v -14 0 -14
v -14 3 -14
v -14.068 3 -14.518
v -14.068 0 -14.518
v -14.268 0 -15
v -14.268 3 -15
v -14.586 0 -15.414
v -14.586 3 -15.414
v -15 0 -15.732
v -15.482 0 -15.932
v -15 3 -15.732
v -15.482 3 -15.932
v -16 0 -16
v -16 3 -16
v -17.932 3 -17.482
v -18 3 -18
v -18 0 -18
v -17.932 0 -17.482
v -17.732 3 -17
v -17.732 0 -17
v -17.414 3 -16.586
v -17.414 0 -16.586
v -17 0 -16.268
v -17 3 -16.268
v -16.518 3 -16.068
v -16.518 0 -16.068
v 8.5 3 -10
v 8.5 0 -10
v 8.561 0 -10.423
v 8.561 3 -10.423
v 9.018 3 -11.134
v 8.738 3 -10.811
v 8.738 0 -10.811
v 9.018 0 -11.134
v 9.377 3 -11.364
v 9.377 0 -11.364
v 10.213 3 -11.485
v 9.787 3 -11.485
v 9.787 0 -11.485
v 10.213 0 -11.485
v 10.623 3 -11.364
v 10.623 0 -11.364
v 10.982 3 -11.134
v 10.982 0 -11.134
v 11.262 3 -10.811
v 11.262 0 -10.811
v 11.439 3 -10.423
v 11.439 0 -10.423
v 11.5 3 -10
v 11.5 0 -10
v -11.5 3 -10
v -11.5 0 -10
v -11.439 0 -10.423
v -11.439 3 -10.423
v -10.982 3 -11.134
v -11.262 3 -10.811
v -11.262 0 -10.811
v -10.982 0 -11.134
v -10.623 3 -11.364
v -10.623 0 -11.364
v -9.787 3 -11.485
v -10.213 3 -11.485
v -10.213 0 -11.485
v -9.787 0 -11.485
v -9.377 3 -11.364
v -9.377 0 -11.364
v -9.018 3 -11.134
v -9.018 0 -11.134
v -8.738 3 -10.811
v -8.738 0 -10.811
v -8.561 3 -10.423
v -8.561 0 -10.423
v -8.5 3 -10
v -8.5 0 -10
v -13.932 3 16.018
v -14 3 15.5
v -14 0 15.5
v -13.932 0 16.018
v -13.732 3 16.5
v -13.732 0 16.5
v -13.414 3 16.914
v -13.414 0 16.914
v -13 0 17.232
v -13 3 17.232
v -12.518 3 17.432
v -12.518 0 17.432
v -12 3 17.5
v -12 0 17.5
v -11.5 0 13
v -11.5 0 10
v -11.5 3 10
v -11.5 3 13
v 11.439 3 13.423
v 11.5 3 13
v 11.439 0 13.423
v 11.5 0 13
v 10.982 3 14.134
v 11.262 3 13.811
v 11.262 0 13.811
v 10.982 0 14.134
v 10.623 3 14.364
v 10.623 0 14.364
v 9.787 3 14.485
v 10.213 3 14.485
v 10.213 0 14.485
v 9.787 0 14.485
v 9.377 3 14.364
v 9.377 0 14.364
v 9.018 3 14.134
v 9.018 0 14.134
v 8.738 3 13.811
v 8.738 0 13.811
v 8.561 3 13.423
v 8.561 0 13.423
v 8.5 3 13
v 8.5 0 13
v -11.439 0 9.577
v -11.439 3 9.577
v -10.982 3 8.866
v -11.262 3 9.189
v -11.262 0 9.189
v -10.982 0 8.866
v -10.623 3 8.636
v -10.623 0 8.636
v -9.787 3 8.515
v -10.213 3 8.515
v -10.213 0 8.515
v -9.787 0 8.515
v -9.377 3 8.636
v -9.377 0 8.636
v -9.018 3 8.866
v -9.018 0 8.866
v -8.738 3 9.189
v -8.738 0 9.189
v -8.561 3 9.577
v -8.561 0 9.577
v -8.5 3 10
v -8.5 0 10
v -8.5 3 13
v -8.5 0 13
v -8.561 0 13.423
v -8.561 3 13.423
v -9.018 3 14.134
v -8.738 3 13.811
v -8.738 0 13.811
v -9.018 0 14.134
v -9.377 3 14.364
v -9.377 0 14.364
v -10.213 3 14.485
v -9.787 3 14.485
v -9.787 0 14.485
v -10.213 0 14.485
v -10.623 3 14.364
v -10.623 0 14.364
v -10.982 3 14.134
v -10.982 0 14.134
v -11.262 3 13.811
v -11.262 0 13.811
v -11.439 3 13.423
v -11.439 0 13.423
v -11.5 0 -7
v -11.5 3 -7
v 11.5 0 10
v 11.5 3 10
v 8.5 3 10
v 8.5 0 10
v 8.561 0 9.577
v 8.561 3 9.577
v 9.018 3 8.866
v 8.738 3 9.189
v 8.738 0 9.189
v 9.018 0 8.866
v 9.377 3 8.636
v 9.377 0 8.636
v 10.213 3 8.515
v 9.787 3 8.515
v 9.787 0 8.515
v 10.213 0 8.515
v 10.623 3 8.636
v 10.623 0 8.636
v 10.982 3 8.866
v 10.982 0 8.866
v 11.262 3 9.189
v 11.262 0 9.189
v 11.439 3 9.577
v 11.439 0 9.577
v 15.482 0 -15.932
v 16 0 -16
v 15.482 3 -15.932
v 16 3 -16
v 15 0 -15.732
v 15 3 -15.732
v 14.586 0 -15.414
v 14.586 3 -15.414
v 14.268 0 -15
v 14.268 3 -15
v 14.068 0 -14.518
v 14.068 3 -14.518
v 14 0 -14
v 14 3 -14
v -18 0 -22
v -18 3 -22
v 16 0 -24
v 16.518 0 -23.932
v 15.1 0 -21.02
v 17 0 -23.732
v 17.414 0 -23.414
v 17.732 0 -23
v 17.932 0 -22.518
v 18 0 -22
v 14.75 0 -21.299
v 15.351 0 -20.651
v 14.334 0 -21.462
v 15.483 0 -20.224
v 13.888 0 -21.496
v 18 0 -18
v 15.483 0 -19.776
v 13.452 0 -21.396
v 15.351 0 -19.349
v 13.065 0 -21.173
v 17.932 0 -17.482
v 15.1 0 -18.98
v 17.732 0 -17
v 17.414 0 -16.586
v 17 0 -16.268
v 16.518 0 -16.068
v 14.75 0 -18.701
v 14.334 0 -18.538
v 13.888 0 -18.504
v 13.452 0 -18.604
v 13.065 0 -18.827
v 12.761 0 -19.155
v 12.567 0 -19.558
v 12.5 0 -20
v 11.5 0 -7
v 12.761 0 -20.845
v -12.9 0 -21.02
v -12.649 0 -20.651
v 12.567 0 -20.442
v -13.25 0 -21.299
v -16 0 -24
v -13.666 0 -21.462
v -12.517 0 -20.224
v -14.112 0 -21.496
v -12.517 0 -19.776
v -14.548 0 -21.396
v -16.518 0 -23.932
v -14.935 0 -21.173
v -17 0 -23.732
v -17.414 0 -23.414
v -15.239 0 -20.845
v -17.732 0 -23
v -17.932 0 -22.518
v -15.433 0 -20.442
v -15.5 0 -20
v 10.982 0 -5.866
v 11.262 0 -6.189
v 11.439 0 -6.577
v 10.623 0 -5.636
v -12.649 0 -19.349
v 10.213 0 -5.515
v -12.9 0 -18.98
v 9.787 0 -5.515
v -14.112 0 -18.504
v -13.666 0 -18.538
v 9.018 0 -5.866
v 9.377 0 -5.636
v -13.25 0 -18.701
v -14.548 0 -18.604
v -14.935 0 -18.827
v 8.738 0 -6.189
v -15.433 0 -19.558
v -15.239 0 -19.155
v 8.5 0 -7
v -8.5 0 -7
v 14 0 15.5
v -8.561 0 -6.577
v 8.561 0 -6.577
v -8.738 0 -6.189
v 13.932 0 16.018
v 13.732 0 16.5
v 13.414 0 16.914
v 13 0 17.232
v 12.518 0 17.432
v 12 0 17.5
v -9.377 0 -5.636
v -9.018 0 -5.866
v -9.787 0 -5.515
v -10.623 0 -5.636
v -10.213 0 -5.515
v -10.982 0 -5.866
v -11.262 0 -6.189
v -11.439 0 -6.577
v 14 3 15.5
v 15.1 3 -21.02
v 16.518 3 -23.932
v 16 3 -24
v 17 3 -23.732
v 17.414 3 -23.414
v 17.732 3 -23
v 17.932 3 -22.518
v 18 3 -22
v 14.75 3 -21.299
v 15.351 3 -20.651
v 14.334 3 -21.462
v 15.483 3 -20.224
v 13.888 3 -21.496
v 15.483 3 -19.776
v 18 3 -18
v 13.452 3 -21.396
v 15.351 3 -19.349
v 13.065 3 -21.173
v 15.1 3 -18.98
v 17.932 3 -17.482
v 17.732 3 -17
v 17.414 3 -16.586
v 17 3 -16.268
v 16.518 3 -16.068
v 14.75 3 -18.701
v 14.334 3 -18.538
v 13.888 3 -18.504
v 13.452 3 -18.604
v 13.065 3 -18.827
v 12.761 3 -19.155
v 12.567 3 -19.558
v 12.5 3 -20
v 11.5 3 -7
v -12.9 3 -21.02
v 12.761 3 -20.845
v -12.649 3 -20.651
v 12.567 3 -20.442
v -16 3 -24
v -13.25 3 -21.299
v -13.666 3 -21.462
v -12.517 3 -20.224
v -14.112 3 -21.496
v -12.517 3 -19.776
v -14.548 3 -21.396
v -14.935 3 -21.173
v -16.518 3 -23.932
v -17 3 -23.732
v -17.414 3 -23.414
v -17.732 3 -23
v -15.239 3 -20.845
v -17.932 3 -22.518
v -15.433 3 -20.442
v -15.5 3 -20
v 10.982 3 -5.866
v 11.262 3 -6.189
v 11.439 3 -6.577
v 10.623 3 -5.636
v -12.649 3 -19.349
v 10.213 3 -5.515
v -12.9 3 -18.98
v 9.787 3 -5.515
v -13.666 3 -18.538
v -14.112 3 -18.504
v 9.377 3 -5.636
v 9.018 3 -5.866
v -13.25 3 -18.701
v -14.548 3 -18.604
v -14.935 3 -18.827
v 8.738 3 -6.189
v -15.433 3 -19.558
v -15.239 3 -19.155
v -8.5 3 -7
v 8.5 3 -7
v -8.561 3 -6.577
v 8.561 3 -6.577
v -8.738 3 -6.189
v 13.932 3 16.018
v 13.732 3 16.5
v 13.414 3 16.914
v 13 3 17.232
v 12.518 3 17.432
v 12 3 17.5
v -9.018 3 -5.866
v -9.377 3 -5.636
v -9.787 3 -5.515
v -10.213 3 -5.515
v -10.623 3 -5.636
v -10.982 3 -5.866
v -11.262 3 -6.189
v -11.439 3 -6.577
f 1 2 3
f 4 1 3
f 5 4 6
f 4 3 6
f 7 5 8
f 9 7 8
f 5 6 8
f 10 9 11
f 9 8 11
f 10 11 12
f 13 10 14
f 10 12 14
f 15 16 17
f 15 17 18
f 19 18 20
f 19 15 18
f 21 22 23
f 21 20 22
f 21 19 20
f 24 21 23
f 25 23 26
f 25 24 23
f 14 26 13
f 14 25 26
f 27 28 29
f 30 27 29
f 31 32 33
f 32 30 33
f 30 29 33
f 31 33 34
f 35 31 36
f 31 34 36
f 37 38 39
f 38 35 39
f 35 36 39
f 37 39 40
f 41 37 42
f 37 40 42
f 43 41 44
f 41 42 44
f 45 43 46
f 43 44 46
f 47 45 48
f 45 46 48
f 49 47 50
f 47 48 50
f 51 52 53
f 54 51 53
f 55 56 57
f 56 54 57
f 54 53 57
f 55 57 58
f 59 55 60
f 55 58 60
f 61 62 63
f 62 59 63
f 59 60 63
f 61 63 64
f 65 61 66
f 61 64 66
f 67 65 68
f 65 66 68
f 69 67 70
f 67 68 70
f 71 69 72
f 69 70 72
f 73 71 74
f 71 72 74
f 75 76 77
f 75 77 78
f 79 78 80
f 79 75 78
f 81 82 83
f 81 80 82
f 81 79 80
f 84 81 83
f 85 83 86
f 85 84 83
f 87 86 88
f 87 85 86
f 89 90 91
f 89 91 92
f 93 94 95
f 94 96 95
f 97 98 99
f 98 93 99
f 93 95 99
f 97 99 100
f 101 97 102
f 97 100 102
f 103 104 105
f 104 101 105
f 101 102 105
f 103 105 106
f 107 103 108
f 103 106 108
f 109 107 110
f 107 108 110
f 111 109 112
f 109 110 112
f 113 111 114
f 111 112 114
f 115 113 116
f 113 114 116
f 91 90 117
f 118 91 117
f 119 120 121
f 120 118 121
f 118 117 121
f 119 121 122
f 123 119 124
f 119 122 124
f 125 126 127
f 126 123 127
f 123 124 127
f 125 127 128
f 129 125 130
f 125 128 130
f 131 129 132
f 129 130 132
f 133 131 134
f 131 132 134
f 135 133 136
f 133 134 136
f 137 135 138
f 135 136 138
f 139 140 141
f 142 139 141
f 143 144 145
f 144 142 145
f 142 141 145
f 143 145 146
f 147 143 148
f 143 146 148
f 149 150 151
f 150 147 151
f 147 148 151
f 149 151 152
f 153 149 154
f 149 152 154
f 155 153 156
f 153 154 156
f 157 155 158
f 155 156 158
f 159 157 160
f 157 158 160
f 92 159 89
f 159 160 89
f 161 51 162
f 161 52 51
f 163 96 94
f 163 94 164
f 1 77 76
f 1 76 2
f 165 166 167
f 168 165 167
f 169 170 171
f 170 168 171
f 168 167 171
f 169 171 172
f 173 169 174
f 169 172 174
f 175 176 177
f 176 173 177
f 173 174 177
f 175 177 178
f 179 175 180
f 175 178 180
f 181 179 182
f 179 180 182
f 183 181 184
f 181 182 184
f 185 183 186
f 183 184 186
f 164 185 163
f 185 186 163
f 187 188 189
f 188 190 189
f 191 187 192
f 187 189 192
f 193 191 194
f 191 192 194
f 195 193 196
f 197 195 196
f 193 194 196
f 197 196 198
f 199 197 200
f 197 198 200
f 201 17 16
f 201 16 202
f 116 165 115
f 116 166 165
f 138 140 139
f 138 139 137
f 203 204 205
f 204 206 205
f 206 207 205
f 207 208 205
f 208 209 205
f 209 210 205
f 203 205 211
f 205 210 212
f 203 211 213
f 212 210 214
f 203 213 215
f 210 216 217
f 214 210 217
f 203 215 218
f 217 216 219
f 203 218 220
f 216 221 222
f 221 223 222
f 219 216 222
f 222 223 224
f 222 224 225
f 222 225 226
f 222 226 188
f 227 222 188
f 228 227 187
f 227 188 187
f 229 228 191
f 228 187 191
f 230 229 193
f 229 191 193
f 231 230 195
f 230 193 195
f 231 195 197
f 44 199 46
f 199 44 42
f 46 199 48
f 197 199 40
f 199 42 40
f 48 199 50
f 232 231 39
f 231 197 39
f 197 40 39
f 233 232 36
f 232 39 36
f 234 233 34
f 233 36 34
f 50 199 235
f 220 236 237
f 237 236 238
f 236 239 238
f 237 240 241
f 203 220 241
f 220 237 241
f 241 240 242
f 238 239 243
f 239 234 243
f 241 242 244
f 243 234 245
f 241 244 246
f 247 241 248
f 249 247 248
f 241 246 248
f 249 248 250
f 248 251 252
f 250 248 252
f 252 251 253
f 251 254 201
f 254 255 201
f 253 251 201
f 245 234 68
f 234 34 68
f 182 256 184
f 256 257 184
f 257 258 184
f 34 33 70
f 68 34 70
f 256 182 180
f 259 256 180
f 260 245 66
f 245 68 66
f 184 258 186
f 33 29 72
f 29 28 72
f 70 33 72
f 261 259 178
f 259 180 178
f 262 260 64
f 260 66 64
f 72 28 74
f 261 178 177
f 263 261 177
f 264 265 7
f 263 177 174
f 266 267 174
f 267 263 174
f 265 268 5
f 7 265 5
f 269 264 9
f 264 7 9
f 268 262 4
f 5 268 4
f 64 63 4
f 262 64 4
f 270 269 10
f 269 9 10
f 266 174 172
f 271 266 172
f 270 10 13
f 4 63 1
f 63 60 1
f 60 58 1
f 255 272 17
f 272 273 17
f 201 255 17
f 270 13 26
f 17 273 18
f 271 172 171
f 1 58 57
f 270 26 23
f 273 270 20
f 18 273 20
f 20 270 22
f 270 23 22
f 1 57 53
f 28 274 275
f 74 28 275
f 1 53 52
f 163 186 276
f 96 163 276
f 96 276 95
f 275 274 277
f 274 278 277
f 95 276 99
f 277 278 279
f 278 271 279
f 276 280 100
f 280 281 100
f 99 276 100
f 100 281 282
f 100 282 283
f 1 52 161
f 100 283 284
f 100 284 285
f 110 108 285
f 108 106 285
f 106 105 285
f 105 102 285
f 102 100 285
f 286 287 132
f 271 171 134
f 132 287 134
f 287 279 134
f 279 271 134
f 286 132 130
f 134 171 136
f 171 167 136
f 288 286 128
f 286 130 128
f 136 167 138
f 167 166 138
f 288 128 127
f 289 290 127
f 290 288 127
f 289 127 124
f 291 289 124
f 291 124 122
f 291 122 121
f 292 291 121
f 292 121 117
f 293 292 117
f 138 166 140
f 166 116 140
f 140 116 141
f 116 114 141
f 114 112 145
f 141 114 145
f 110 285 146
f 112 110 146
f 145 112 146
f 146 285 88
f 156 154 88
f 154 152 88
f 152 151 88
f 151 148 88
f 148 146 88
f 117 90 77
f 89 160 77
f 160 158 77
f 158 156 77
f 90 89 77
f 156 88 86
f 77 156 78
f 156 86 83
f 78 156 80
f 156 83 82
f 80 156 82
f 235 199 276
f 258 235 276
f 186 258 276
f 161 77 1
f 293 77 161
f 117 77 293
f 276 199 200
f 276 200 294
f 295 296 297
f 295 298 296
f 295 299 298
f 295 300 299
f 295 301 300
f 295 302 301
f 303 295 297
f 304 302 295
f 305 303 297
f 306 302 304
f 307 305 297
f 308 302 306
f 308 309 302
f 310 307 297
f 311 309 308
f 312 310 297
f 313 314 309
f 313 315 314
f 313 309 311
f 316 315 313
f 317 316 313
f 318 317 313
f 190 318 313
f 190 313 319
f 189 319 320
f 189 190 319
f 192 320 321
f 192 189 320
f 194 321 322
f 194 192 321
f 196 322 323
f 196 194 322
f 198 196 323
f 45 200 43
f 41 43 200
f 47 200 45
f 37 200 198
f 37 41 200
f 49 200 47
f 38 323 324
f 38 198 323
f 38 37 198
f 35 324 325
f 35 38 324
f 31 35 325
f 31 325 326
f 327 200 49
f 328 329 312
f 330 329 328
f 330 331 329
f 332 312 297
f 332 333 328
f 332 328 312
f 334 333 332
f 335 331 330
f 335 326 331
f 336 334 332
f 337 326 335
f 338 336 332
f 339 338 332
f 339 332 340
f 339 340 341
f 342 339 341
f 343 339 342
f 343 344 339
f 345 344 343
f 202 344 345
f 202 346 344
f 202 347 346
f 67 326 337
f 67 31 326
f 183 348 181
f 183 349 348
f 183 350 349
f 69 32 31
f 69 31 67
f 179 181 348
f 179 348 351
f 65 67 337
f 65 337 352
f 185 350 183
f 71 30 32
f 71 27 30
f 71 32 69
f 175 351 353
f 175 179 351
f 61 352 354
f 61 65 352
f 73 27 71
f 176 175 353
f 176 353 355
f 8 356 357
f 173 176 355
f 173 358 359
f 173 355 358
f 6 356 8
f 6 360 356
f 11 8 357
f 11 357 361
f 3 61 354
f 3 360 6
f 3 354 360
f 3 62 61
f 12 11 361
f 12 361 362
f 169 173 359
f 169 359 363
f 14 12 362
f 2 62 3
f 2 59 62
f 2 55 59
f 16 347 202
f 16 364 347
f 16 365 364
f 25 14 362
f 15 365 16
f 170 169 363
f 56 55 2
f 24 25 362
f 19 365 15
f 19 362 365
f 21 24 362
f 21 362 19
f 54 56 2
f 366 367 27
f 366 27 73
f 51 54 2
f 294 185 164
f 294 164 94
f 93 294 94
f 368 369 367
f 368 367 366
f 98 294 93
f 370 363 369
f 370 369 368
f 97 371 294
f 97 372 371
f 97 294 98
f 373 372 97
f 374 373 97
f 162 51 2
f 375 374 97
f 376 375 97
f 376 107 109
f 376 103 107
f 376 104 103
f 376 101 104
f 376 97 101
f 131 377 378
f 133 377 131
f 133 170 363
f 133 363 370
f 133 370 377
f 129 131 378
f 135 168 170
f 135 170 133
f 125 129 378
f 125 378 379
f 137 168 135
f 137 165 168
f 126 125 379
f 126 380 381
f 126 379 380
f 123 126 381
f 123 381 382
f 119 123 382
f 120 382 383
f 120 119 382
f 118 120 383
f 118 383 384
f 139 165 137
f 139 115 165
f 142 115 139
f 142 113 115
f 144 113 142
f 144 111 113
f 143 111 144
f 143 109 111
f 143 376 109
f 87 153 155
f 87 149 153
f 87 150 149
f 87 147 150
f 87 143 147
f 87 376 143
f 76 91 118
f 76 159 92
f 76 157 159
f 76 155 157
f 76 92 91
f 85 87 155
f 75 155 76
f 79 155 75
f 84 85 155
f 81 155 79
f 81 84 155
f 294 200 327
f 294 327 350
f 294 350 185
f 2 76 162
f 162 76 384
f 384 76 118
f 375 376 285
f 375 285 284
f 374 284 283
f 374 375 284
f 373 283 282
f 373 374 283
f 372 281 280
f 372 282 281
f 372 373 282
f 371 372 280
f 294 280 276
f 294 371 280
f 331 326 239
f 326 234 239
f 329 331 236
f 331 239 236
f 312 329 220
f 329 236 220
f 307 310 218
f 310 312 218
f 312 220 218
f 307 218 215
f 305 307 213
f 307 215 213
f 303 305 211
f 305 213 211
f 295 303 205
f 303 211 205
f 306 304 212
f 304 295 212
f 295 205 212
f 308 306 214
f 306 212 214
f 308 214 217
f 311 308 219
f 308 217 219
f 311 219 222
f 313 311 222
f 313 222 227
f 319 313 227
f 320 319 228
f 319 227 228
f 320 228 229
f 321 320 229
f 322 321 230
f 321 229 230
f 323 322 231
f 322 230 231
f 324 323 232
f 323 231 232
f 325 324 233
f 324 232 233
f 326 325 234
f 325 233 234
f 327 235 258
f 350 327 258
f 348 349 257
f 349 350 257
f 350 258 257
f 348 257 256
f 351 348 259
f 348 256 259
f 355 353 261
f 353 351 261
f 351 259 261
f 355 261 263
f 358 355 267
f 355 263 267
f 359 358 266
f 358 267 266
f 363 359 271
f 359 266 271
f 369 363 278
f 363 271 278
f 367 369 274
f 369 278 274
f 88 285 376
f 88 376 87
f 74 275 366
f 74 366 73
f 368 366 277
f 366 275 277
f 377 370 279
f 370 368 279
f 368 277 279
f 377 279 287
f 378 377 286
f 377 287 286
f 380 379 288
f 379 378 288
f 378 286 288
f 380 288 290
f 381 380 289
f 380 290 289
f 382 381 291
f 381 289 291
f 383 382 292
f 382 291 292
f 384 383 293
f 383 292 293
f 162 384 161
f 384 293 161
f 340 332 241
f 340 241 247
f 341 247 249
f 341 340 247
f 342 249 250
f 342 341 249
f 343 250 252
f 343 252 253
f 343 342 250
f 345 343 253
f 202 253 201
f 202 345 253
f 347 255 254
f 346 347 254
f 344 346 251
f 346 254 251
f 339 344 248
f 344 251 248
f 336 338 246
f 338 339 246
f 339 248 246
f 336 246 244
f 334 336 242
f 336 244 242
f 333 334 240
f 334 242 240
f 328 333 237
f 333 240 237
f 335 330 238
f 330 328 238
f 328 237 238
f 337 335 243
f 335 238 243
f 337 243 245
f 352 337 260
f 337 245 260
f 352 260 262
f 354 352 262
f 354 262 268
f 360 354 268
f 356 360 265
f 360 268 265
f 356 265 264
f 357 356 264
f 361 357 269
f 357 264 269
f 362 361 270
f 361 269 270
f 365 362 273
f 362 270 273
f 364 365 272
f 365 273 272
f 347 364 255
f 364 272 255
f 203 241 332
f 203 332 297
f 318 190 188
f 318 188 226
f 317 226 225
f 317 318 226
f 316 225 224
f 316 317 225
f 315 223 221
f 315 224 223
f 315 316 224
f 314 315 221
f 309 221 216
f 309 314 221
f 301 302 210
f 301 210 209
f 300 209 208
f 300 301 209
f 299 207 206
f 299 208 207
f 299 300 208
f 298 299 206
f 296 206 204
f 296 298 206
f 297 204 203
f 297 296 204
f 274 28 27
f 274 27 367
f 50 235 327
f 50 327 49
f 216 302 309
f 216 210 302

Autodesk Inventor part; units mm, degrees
ref_plane "YZ Plane" through (0, 0, 0) normal (1, 0, 0) x (0, 1, 0)
ref_plane "XZ Plane" through (0, 0, 0) normal (0, 1, 0) x (-1, 0, 0)
ref_plane "XY Plane" through (0, 0, 0) normal (0, 0, 1) x (1, 0, 0)
sketch "Sketch1" plane through (0, 0, 0) normal (0, 1, 0) x (-1, 0, 0)
  line L0 (10, -10) -> (-10, -10) construction
  line L1 (-10, -10) -> (-10, 10) construction
  line L2 (-10, 10) -> (10, 10) construction
  line L3 (10, 10) -> (10, -10) construction
  line L4 (10, -10) -> (-10, 10) construction
  line L5 (-10, -10) -> (10, 10) construction
  line L6 (10, -10) -> (10, -7) construction
  line L7 (11.5, -10) -> (11.5, -7)
  line L8 (8.5, -7) -> (8.5, -10)
  arc A0 (8.5, -10) -> (11.5, -10) centre (10, -10) ccw
  arc A1 (11.5, -7) -> (8.5, -7) centre (10, -7) ccw
  line L9 (-10, -10) -> (-10, -7) construction
  line L10 (-8.5, -10) -> (-8.5, -7)
  line L11 (-11.5, -7) -> (-11.5, -10)
  arc A2 (-11.5, -10) -> (-8.5, -10) centre (-10, -10) ccw
  arc A3 (-8.5, -7) -> (-11.5, -7) centre (-10, -7) ccw
  line L12 (10, 10) -> (10, 13) construction
  line L13 (11.5, 10) -> (11.5, 13)
  line L14 (8.5, 13) -> (8.5, 10)
  arc A4 (8.5, 10) -> (11.5, 10) centre (10, 10) ccw
  arc A5 (11.5, 13) -> (8.5, 13) centre (10, 13) ccw
  line L15 (-10, 10) -> (-10, 13) construction
  line L16 (-8.5, 10) -> (-8.5, 13)
  line L17 (-11.5, 13) -> (-11.5, 10)
  arc A6 (-11.5, 10) -> (-8.5, 10) centre (-10, 10) ccw
  arc A7 (-8.5, 13) -> (-11.5, 13) centre (-10, 13) ccw
  circle A8 centre (14, -20) radius 1.5
  circle A9 centre (-14, -20) radius 1.5
  line L18 (14, -20) -> (-14, -20) construction
  line L19 (18, -24) -> (-18, -24)
  line L20 (-18, -24) -> (-18, -16)
  line L21 (-18, -16) -> (-14, -16)
  line L22 (-14, -16) -> (-14, 17.5)
  line L23 (-14, 17.5) -> (14, 17.5)
  line L24 (14, 17.5) -> (14, -16)
  line L25 (14, -16) -> (18, -16)
  line L26 (18, -16) -> (18, -24)
  point P0 (0, 0)
  point P1 (10, -8.5)
  point P2 (-10, -8.5)
  point P3 (10, 11.5)
  point P4 (-10, 11.5)
  point P5 (0, -20)
  point P6 (0, 0)
  point P7 (0, -24)
  dimension "d0" = 20
  dimension "d1" = 20
  dimension "d2" = 3
  dimension "d3" = 3
  dimension "d4" = 3
  dimension "d5" = 3
  dimension "d6" = 3
  dimension "d7" = 3
  dimension "d8" = 3
  dimension "d9" = 3
  dimension "d10" = 3
  dimension "d11" = 10
  dimension "d12" = 28
  dimension "d13" = 4
  dimension "d15" = 4
  dimension "d16" = 4
  dimension "d17" = 36
  dimension "d18" = 3
extrude "Extrusion1" add sketch "Sketch1" along normal blind 3
fillet "Fillet1" radius 2 8 edges at (14, 1.5, -16) (14, 1.5, 17.5) (-14, 1.5, 17.5) (-14, 1.5, -16) (-18, 1.5, -16) (-18, 1.5, -24) (18, 1.5, -24) (18, 1.5, -16)
properties part number "SecondaryEncoderPCBMount" material "ABS Plastic"
